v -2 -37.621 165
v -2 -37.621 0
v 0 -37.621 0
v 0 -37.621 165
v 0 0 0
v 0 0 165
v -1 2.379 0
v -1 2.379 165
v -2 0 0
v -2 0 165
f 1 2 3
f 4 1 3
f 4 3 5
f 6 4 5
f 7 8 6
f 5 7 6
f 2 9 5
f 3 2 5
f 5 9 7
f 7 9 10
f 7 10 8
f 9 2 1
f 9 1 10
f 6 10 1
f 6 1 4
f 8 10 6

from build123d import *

# Parameters (mm, degrees)
SKETCH1_W           = 2
SKETCH1_H           = 40
BOSS_EXTRUDE1_DEPTH = 165
CUT_EXTRUDE1_DEPTH  = 165
CUT_EXTRUDE2_DEPTH  = 165


with BuildPart() as part:
    # Sketch1 → Boss-Extrude1 (new body)
    with BuildSketch(Plane.XY):
        with Locations((-1, -17.620909594)):
            Rectangle(SKETCH1_W, SKETCH1_H)
    extrude(amount=BOSS_EXTRUDE1_DEPTH)

    # Sketch2 → Cut-Extrude1 (cut)
    with BuildSketch(Plane.XY.offset(165)):
        Polygon((0, 2.379090406), (-1, 2.379090406), (0, 0), align=None)
    extrude(amount=-CUT_EXTRUDE1_DEPTH, mode=Mode.SUBTRACT)

    # Sketch3 → Cut-Extrude2 (cut)
    with BuildSketch(Plane.XY.offset(165)):
        Polygon((-1, 2.379090406), (-2, 2.379090406), (-2, 0), align=None)
    extrude(amount=-CUT_EXTRUDE2_DEPTH, mode=Mode.SUBTRACT)


solid = part.part
